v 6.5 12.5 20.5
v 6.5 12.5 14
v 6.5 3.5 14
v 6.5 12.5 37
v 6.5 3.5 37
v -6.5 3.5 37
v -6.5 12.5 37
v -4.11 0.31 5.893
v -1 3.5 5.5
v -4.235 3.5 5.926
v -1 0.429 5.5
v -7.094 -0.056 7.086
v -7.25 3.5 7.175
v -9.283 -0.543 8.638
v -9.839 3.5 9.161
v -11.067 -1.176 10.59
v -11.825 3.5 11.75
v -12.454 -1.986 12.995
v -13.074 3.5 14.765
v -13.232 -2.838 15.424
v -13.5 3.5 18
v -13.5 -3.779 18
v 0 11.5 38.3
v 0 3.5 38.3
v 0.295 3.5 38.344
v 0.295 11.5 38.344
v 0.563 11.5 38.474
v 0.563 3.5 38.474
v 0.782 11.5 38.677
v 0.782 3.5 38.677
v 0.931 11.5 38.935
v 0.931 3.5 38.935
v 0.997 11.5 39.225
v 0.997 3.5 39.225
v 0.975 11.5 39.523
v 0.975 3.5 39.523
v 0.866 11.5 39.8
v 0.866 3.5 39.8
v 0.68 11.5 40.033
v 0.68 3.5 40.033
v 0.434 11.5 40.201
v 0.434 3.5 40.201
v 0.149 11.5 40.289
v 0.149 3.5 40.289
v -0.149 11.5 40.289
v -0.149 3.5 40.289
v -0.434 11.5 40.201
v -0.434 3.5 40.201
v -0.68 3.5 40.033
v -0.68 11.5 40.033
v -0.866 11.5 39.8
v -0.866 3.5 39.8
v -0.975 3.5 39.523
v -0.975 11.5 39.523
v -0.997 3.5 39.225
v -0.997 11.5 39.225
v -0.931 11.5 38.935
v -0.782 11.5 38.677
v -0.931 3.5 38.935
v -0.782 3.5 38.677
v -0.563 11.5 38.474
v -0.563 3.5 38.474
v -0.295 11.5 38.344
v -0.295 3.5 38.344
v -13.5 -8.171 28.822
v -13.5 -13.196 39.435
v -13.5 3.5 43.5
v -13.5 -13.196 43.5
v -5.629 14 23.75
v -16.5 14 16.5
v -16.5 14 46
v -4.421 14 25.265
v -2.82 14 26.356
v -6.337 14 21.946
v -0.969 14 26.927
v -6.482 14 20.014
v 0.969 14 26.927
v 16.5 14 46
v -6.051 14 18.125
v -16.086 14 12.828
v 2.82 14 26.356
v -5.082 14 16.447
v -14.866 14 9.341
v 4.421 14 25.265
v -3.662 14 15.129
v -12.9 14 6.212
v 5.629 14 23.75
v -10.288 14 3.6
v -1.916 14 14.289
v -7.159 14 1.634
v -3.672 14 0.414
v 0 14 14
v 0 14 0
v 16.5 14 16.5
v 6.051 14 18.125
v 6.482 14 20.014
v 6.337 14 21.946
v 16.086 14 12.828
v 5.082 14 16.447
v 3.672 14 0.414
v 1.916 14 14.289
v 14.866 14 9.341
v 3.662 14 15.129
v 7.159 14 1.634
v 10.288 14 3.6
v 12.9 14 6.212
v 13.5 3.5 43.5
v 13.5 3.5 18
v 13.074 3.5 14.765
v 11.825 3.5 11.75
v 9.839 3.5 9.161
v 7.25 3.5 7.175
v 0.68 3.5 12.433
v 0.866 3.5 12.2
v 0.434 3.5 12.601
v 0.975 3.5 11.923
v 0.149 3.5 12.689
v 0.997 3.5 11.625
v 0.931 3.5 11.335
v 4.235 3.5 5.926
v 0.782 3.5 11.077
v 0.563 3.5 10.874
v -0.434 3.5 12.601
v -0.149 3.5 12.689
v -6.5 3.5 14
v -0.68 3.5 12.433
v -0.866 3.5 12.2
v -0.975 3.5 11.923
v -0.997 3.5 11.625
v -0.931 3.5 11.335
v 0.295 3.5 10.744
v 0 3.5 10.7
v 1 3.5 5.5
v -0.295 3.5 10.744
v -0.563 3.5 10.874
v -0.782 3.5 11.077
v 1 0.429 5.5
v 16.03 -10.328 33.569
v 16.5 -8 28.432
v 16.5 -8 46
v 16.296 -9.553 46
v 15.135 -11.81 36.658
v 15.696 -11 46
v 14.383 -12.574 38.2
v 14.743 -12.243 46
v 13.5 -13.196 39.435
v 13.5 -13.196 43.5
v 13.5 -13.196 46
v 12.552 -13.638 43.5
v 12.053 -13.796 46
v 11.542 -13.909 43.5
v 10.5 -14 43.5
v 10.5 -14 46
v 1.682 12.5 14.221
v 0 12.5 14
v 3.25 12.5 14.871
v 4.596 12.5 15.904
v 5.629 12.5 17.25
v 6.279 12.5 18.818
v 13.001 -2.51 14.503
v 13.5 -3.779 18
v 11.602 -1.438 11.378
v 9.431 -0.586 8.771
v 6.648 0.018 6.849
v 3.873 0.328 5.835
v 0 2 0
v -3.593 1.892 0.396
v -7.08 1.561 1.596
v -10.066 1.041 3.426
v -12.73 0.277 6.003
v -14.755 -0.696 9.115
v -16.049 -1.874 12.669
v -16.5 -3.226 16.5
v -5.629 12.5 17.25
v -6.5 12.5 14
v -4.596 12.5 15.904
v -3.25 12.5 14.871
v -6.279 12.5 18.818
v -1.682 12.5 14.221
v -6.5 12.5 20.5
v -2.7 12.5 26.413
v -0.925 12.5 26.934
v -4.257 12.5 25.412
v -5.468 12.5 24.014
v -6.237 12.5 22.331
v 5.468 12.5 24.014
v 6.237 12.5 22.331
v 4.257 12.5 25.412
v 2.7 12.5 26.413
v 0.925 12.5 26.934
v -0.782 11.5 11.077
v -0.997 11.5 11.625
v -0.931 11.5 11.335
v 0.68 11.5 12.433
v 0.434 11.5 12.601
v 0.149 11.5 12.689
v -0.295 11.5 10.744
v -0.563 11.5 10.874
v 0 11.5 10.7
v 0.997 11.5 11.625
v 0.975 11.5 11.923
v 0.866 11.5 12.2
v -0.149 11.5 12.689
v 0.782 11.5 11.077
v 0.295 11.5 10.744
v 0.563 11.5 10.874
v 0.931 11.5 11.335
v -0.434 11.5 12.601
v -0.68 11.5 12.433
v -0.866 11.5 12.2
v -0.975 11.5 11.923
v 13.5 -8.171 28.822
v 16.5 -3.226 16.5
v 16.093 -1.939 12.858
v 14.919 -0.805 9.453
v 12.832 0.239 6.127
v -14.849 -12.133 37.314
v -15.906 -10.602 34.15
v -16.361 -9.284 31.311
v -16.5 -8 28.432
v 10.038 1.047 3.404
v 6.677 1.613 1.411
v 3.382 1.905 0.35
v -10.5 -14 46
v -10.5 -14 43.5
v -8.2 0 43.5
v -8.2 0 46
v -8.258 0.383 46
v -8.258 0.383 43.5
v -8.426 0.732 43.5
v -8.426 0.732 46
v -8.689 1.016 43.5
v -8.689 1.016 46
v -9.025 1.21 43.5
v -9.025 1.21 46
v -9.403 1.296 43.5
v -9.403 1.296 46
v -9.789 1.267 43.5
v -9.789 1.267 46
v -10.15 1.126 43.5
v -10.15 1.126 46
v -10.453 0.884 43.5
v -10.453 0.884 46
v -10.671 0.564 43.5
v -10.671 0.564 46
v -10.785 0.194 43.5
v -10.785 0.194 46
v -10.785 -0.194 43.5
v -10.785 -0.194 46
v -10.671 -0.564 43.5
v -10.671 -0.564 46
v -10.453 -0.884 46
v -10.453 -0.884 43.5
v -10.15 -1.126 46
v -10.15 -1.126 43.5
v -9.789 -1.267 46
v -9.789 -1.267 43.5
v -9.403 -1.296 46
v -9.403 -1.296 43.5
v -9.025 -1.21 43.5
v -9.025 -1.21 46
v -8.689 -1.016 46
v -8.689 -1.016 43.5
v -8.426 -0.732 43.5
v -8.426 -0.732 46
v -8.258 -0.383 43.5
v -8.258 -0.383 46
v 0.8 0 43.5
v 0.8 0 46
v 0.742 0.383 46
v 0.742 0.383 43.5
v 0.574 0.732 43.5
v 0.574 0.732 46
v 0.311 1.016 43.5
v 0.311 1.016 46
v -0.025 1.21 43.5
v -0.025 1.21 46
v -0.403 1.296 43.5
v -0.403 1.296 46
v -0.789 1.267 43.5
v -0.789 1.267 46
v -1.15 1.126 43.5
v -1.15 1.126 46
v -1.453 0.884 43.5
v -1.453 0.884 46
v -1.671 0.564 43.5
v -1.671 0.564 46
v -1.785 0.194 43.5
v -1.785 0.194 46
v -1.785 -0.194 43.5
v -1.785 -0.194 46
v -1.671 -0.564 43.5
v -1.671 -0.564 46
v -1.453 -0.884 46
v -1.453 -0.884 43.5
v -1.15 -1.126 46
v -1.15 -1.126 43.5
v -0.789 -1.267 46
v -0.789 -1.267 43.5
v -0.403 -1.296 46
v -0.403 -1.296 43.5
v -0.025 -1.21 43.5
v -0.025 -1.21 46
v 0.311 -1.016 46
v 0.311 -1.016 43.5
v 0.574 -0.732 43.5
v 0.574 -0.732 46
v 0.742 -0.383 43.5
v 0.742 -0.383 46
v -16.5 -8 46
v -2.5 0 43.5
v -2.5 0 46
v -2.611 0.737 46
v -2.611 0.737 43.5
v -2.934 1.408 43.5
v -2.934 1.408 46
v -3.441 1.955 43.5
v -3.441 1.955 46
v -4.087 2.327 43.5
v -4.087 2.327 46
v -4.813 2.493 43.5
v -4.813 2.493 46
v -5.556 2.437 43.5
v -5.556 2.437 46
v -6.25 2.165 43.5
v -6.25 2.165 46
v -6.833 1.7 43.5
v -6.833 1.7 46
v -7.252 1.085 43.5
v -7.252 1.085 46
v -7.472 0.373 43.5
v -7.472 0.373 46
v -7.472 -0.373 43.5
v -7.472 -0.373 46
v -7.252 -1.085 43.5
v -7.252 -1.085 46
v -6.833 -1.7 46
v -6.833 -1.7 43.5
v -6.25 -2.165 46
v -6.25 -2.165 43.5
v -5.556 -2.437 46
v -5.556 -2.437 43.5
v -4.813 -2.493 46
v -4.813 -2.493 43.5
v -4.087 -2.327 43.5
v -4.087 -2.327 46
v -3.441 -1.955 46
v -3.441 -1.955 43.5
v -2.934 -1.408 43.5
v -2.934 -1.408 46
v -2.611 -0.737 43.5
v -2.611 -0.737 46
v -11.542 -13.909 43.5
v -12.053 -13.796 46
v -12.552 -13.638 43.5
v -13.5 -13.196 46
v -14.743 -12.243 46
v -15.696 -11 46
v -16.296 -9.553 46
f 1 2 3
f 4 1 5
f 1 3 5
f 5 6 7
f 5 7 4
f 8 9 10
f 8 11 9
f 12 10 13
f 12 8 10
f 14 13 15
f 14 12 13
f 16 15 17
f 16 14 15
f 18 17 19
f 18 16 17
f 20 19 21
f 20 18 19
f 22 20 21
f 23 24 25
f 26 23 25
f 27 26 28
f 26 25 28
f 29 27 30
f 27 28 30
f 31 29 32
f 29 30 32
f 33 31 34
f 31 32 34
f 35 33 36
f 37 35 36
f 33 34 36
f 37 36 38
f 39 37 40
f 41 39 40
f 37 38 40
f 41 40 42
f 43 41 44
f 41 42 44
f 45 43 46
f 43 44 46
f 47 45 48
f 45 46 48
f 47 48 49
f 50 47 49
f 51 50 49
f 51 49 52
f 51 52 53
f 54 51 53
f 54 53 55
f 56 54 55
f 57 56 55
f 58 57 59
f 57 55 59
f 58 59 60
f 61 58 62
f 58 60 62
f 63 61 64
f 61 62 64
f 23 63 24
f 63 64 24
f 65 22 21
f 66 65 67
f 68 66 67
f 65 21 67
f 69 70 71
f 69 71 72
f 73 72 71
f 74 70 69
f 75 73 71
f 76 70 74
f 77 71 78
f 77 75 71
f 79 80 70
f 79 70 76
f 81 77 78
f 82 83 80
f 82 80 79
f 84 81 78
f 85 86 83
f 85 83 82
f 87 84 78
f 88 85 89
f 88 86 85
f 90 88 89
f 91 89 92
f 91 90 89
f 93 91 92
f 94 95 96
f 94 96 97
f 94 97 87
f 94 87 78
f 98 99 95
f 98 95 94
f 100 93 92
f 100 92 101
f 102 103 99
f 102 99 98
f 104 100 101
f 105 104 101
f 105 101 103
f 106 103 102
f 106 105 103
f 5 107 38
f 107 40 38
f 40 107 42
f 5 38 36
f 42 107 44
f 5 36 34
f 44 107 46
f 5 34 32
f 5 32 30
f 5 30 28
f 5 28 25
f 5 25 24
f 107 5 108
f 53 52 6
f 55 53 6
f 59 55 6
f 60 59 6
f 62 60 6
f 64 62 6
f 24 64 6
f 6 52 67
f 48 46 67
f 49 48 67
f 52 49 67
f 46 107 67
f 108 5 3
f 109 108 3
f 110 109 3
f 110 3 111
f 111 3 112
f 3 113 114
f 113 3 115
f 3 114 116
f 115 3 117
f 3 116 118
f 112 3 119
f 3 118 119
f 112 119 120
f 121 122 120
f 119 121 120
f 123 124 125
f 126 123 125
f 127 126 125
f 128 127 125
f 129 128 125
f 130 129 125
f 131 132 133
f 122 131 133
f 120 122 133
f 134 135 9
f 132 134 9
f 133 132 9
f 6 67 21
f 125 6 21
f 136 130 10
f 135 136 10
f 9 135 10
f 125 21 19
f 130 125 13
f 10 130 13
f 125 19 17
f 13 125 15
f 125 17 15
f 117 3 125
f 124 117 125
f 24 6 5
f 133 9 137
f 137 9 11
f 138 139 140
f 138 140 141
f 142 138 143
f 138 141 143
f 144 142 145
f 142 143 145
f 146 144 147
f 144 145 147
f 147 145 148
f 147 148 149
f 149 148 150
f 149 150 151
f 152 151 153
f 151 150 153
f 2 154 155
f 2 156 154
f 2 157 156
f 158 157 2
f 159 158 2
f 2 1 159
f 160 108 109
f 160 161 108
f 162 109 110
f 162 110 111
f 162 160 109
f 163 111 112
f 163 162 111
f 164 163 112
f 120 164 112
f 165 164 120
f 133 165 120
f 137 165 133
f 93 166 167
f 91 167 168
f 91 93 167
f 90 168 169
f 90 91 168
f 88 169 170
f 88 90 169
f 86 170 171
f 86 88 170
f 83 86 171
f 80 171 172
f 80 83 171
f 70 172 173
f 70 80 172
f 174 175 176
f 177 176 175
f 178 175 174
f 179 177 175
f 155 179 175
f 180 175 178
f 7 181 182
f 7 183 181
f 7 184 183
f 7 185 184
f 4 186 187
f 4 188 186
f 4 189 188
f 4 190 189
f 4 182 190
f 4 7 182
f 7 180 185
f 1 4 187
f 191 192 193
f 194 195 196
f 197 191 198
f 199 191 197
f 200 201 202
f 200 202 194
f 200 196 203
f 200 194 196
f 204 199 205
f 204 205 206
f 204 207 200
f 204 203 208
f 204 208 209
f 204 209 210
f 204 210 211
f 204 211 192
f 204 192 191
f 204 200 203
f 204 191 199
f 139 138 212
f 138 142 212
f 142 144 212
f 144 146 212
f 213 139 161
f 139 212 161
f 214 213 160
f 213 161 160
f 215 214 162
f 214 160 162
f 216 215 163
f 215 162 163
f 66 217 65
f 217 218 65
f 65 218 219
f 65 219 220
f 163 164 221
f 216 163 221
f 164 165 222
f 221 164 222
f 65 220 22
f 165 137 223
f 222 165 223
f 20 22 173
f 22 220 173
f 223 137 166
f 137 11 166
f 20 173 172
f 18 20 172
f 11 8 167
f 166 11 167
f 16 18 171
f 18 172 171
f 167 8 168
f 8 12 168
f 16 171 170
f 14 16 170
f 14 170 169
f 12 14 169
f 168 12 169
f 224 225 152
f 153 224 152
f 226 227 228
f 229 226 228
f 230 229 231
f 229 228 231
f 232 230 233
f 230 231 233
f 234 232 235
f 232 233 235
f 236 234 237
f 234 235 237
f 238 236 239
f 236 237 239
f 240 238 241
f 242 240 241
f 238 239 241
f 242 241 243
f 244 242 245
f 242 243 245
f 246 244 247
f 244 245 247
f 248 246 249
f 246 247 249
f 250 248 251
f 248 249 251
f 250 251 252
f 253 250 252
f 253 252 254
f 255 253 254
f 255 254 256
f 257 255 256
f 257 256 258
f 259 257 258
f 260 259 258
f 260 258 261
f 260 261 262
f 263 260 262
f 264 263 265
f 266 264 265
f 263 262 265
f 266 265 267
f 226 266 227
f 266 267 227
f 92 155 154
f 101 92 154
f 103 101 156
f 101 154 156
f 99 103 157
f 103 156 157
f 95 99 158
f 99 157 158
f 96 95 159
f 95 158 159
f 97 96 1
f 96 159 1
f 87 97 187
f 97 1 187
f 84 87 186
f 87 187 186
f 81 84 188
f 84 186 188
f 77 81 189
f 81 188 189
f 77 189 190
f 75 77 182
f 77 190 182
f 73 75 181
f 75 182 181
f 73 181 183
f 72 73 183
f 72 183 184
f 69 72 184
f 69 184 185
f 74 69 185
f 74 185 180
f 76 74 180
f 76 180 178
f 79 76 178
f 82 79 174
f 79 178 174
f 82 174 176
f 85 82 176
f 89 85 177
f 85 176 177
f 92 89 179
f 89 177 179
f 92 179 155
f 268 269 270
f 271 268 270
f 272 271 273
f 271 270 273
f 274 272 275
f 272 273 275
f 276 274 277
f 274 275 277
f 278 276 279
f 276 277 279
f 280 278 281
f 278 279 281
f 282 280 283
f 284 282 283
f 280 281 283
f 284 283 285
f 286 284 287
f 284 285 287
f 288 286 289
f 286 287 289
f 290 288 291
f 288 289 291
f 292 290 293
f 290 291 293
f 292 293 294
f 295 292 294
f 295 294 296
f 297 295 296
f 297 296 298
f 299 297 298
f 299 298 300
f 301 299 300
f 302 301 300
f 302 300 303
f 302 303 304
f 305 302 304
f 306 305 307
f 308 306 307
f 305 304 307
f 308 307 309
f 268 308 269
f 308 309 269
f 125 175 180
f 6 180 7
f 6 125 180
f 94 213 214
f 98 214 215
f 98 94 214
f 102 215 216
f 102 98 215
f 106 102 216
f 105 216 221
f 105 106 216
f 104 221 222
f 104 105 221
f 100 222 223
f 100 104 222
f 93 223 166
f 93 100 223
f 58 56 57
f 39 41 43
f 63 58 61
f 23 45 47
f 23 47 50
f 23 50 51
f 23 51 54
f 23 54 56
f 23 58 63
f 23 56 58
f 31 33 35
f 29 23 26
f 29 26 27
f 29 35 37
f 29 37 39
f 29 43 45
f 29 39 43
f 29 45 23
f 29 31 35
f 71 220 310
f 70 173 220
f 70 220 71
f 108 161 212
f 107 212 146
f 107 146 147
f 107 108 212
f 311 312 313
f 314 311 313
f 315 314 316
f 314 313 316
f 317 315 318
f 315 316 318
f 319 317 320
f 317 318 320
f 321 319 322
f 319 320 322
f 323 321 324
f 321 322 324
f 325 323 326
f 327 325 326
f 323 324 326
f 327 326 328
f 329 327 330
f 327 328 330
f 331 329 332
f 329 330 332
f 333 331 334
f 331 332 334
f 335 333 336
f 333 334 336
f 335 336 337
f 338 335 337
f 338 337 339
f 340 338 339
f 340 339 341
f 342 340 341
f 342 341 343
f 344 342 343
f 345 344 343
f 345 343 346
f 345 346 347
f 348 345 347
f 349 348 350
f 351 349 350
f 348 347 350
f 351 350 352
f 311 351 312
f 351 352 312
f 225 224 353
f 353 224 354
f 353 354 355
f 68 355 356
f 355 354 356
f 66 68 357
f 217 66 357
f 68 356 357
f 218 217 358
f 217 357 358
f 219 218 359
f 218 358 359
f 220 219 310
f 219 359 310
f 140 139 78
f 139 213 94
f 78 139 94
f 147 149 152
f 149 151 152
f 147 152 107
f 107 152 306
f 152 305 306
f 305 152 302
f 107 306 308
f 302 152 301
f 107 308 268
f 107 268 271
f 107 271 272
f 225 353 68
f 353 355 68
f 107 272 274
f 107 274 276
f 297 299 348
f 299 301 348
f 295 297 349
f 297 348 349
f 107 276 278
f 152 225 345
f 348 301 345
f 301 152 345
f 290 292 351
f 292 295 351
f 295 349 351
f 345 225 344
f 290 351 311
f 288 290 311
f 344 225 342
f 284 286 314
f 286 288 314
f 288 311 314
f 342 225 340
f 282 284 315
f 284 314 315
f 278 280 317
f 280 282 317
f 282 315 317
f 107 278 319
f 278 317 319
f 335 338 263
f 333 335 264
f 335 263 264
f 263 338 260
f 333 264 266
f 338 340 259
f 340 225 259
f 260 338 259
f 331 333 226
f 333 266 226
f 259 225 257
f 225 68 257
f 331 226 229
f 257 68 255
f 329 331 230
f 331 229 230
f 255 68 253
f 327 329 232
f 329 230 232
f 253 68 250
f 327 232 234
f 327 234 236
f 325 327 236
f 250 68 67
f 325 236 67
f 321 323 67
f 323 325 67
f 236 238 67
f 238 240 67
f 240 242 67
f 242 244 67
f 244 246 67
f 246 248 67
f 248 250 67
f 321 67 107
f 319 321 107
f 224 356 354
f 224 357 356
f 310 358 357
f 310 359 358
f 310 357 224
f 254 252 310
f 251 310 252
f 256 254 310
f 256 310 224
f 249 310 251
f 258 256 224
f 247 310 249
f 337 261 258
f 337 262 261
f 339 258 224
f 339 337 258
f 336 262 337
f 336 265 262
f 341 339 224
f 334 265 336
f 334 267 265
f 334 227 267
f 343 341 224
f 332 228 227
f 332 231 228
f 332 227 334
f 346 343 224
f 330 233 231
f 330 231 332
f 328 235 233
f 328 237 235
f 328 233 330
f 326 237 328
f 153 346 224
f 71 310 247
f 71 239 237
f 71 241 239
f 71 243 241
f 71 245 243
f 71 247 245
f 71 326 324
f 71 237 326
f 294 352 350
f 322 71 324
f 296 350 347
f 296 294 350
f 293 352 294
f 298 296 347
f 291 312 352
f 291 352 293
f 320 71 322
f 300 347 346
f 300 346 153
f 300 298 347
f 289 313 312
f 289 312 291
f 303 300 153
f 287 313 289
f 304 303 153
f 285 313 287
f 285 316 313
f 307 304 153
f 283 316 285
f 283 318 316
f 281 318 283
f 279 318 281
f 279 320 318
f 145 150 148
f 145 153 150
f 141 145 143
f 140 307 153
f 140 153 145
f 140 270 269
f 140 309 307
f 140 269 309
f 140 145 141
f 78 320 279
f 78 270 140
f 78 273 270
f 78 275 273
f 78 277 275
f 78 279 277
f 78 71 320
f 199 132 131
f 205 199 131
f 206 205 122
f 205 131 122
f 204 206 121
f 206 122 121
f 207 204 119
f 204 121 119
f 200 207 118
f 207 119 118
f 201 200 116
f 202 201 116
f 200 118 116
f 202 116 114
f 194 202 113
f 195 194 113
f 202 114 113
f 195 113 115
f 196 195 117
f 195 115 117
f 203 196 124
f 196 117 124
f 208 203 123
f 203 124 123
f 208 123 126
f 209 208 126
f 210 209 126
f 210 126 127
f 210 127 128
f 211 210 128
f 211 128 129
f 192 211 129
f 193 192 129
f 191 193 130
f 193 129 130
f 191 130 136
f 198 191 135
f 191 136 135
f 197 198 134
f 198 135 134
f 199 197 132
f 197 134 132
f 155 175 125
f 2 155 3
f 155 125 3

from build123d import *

# Parameters (mm, degrees)
SKETCH1_W           = 33
SKETCH1_H           = 28
BOSS_EXTRUDE1_DEPTH = 46
CUT_EXTRUDE1_DEPTH  = 59.318093247
CUT_EXTRUDE2_START  = -3
CUT_EXTRUDE2_DEPTH  = 27
FILLET1_R           = 12.5
FILLET2_R           = 16.5
FILLET3_R           = 6
SKETCH6_W           = 13
SKETCH6_H           = 23
CUT_EXTRUDE3_DEPTH  = 9
SKETCH8_R           = 6.5
CUT_EXTRUDE4_DEPTH  = 9
SKETCH9_R           = 1
CUT_EXTRUDE5_DEPTH  = 8
SKETCH10_R          = 1.3
SKETCH10_R_2        = 2.5
CUT_EXTRUDE6_DEPTH  = 2.5


with BuildPart() as part:
    # Sketch1 → Boss-Extrude1 (new body)
    with BuildSketch(Plane.XY):
        Rectangle(SKETCH1_W, SKETCH1_H)
    extrude(amount=BOSS_EXTRUDE1_DEPTH)

    # Sketch3 → Cut-Extrude1 (cut, through all)
    with BuildSketch(Plane.ZY.offset(16.5)):
        with BuildLine():
            Line((0, 2), (0, -14))
            Line((0, -14), (41, -14))
            add(Edge.make_bspline(
                [(41, -14), (21.241610725, -3.748388801), (0, 2)],
                knots=[0, 0, 0, 1, 1, 1], degree=2))
        make_face()
    extrude(amount=-CUT_EXTRUDE1_DEPTH, mode=Mode.SUBTRACT)

    # Sketch4 → Cut-Extrude2 (cut)
    with BuildSketch(Plane.ZY.offset(16.5).offset(CUT_EXTRUDE2_START)):
        with BuildLine():
            Line((41, -14), (43.5, -14))
            Line((43.5, -14), (43.5, 3.5))
            Line((43.5, 3.5), (5.5, 3.5))
            Line((5.5, 3.5), (5.5, 0.428638096))
            add(Edge.make_bspline(
                [(41, -14), (23.811256263, -5.081645607), (5.5, 0.428638096)],
                knots=[0, 0, 0, 1, 1, 1], degree=2))
        make_face()
    extrude(amount=-CUT_EXTRUDE2_DEPTH, mode=Mode.SUBTRACT)

    # Fillet1
    fillet1_edges = [part.edges().sort_by_distance(p)[0] for p in [
        (-13.5, 1.964319048, 5.5),
        (13.5, 1.964319048, 5.5),
    ]]
    fillet(fillet1_edges, radius=FILLET1_R)

    # Fillet2
    fillet2_edges = [part.edges().sort_by_distance(p)[0] for p in [
        (-16.5, 8, 0),
        (16.5, 8, 0),
    ]]
    fillet(fillet2_edges, radius=FILLET2_R - 0.0001)  # a hair under: the kernel refuses the full size

    # Fillet3
    fillet3_edges = [part.edges().sort_by_distance(p)[0] for p in [
        (16.5, -14, 43.5),
        (-16.5, -14, 43.5),
    ]]
    fillet(fillet3_edges, radius=FILLET3_R)

    # Sketch6 → Cut-Extrude3 (cut)
    with BuildSketch(Plane.XZ.offset(-3.5)):
        with Locations((0, 25.5)):
            Rectangle(SKETCH6_W, SKETCH6_H)
    extrude(amount=-CUT_EXTRUDE3_DEPTH, mode=Mode.SUBTRACT)

    # Sketch8 → Cut-Extrude4 (cut)
    with BuildSketch(Plane.XZ.offset(-12.5)):
        with Locations(Location((0, 20.5, 0), (0, 0, 270))):
            Circle(SKETCH8_R)
    extrude(amount=-CUT_EXTRUDE4_DEPTH, mode=Mode.SUBTRACT)

    # Sketch9 → Cut-Extrude5 (cut)
    with BuildSketch(Plane.XZ.offset(-3.5)):
        with Locations(Location((0, 39.3, 0), (0, 0, 270))):
            Circle(SKETCH9_R)
        with Locations(Location((0, 11.7, 0), (0, 0, 270))):
            Circle(SKETCH9_R)
    extrude(amount=-CUT_EXTRUDE5_DEPTH, mode=Mode.SUBTRACT)

    # Sketch10 → Cut-Extrude6 (cut)
    with BuildSketch(Plane.XY.offset(46)):
        with Locations((-9.5, 0)):
            Circle(SKETCH10_R)
        with Locations((-5, 0)):
            Circle(SKETCH10_R_2)
        with Locations((-0.5, 0)):
            Circle(SKETCH10_R)
    extrude(amount=-CUT_EXTRUDE6_DEPTH, mode=Mode.SUBTRACT)


solid = part.part
